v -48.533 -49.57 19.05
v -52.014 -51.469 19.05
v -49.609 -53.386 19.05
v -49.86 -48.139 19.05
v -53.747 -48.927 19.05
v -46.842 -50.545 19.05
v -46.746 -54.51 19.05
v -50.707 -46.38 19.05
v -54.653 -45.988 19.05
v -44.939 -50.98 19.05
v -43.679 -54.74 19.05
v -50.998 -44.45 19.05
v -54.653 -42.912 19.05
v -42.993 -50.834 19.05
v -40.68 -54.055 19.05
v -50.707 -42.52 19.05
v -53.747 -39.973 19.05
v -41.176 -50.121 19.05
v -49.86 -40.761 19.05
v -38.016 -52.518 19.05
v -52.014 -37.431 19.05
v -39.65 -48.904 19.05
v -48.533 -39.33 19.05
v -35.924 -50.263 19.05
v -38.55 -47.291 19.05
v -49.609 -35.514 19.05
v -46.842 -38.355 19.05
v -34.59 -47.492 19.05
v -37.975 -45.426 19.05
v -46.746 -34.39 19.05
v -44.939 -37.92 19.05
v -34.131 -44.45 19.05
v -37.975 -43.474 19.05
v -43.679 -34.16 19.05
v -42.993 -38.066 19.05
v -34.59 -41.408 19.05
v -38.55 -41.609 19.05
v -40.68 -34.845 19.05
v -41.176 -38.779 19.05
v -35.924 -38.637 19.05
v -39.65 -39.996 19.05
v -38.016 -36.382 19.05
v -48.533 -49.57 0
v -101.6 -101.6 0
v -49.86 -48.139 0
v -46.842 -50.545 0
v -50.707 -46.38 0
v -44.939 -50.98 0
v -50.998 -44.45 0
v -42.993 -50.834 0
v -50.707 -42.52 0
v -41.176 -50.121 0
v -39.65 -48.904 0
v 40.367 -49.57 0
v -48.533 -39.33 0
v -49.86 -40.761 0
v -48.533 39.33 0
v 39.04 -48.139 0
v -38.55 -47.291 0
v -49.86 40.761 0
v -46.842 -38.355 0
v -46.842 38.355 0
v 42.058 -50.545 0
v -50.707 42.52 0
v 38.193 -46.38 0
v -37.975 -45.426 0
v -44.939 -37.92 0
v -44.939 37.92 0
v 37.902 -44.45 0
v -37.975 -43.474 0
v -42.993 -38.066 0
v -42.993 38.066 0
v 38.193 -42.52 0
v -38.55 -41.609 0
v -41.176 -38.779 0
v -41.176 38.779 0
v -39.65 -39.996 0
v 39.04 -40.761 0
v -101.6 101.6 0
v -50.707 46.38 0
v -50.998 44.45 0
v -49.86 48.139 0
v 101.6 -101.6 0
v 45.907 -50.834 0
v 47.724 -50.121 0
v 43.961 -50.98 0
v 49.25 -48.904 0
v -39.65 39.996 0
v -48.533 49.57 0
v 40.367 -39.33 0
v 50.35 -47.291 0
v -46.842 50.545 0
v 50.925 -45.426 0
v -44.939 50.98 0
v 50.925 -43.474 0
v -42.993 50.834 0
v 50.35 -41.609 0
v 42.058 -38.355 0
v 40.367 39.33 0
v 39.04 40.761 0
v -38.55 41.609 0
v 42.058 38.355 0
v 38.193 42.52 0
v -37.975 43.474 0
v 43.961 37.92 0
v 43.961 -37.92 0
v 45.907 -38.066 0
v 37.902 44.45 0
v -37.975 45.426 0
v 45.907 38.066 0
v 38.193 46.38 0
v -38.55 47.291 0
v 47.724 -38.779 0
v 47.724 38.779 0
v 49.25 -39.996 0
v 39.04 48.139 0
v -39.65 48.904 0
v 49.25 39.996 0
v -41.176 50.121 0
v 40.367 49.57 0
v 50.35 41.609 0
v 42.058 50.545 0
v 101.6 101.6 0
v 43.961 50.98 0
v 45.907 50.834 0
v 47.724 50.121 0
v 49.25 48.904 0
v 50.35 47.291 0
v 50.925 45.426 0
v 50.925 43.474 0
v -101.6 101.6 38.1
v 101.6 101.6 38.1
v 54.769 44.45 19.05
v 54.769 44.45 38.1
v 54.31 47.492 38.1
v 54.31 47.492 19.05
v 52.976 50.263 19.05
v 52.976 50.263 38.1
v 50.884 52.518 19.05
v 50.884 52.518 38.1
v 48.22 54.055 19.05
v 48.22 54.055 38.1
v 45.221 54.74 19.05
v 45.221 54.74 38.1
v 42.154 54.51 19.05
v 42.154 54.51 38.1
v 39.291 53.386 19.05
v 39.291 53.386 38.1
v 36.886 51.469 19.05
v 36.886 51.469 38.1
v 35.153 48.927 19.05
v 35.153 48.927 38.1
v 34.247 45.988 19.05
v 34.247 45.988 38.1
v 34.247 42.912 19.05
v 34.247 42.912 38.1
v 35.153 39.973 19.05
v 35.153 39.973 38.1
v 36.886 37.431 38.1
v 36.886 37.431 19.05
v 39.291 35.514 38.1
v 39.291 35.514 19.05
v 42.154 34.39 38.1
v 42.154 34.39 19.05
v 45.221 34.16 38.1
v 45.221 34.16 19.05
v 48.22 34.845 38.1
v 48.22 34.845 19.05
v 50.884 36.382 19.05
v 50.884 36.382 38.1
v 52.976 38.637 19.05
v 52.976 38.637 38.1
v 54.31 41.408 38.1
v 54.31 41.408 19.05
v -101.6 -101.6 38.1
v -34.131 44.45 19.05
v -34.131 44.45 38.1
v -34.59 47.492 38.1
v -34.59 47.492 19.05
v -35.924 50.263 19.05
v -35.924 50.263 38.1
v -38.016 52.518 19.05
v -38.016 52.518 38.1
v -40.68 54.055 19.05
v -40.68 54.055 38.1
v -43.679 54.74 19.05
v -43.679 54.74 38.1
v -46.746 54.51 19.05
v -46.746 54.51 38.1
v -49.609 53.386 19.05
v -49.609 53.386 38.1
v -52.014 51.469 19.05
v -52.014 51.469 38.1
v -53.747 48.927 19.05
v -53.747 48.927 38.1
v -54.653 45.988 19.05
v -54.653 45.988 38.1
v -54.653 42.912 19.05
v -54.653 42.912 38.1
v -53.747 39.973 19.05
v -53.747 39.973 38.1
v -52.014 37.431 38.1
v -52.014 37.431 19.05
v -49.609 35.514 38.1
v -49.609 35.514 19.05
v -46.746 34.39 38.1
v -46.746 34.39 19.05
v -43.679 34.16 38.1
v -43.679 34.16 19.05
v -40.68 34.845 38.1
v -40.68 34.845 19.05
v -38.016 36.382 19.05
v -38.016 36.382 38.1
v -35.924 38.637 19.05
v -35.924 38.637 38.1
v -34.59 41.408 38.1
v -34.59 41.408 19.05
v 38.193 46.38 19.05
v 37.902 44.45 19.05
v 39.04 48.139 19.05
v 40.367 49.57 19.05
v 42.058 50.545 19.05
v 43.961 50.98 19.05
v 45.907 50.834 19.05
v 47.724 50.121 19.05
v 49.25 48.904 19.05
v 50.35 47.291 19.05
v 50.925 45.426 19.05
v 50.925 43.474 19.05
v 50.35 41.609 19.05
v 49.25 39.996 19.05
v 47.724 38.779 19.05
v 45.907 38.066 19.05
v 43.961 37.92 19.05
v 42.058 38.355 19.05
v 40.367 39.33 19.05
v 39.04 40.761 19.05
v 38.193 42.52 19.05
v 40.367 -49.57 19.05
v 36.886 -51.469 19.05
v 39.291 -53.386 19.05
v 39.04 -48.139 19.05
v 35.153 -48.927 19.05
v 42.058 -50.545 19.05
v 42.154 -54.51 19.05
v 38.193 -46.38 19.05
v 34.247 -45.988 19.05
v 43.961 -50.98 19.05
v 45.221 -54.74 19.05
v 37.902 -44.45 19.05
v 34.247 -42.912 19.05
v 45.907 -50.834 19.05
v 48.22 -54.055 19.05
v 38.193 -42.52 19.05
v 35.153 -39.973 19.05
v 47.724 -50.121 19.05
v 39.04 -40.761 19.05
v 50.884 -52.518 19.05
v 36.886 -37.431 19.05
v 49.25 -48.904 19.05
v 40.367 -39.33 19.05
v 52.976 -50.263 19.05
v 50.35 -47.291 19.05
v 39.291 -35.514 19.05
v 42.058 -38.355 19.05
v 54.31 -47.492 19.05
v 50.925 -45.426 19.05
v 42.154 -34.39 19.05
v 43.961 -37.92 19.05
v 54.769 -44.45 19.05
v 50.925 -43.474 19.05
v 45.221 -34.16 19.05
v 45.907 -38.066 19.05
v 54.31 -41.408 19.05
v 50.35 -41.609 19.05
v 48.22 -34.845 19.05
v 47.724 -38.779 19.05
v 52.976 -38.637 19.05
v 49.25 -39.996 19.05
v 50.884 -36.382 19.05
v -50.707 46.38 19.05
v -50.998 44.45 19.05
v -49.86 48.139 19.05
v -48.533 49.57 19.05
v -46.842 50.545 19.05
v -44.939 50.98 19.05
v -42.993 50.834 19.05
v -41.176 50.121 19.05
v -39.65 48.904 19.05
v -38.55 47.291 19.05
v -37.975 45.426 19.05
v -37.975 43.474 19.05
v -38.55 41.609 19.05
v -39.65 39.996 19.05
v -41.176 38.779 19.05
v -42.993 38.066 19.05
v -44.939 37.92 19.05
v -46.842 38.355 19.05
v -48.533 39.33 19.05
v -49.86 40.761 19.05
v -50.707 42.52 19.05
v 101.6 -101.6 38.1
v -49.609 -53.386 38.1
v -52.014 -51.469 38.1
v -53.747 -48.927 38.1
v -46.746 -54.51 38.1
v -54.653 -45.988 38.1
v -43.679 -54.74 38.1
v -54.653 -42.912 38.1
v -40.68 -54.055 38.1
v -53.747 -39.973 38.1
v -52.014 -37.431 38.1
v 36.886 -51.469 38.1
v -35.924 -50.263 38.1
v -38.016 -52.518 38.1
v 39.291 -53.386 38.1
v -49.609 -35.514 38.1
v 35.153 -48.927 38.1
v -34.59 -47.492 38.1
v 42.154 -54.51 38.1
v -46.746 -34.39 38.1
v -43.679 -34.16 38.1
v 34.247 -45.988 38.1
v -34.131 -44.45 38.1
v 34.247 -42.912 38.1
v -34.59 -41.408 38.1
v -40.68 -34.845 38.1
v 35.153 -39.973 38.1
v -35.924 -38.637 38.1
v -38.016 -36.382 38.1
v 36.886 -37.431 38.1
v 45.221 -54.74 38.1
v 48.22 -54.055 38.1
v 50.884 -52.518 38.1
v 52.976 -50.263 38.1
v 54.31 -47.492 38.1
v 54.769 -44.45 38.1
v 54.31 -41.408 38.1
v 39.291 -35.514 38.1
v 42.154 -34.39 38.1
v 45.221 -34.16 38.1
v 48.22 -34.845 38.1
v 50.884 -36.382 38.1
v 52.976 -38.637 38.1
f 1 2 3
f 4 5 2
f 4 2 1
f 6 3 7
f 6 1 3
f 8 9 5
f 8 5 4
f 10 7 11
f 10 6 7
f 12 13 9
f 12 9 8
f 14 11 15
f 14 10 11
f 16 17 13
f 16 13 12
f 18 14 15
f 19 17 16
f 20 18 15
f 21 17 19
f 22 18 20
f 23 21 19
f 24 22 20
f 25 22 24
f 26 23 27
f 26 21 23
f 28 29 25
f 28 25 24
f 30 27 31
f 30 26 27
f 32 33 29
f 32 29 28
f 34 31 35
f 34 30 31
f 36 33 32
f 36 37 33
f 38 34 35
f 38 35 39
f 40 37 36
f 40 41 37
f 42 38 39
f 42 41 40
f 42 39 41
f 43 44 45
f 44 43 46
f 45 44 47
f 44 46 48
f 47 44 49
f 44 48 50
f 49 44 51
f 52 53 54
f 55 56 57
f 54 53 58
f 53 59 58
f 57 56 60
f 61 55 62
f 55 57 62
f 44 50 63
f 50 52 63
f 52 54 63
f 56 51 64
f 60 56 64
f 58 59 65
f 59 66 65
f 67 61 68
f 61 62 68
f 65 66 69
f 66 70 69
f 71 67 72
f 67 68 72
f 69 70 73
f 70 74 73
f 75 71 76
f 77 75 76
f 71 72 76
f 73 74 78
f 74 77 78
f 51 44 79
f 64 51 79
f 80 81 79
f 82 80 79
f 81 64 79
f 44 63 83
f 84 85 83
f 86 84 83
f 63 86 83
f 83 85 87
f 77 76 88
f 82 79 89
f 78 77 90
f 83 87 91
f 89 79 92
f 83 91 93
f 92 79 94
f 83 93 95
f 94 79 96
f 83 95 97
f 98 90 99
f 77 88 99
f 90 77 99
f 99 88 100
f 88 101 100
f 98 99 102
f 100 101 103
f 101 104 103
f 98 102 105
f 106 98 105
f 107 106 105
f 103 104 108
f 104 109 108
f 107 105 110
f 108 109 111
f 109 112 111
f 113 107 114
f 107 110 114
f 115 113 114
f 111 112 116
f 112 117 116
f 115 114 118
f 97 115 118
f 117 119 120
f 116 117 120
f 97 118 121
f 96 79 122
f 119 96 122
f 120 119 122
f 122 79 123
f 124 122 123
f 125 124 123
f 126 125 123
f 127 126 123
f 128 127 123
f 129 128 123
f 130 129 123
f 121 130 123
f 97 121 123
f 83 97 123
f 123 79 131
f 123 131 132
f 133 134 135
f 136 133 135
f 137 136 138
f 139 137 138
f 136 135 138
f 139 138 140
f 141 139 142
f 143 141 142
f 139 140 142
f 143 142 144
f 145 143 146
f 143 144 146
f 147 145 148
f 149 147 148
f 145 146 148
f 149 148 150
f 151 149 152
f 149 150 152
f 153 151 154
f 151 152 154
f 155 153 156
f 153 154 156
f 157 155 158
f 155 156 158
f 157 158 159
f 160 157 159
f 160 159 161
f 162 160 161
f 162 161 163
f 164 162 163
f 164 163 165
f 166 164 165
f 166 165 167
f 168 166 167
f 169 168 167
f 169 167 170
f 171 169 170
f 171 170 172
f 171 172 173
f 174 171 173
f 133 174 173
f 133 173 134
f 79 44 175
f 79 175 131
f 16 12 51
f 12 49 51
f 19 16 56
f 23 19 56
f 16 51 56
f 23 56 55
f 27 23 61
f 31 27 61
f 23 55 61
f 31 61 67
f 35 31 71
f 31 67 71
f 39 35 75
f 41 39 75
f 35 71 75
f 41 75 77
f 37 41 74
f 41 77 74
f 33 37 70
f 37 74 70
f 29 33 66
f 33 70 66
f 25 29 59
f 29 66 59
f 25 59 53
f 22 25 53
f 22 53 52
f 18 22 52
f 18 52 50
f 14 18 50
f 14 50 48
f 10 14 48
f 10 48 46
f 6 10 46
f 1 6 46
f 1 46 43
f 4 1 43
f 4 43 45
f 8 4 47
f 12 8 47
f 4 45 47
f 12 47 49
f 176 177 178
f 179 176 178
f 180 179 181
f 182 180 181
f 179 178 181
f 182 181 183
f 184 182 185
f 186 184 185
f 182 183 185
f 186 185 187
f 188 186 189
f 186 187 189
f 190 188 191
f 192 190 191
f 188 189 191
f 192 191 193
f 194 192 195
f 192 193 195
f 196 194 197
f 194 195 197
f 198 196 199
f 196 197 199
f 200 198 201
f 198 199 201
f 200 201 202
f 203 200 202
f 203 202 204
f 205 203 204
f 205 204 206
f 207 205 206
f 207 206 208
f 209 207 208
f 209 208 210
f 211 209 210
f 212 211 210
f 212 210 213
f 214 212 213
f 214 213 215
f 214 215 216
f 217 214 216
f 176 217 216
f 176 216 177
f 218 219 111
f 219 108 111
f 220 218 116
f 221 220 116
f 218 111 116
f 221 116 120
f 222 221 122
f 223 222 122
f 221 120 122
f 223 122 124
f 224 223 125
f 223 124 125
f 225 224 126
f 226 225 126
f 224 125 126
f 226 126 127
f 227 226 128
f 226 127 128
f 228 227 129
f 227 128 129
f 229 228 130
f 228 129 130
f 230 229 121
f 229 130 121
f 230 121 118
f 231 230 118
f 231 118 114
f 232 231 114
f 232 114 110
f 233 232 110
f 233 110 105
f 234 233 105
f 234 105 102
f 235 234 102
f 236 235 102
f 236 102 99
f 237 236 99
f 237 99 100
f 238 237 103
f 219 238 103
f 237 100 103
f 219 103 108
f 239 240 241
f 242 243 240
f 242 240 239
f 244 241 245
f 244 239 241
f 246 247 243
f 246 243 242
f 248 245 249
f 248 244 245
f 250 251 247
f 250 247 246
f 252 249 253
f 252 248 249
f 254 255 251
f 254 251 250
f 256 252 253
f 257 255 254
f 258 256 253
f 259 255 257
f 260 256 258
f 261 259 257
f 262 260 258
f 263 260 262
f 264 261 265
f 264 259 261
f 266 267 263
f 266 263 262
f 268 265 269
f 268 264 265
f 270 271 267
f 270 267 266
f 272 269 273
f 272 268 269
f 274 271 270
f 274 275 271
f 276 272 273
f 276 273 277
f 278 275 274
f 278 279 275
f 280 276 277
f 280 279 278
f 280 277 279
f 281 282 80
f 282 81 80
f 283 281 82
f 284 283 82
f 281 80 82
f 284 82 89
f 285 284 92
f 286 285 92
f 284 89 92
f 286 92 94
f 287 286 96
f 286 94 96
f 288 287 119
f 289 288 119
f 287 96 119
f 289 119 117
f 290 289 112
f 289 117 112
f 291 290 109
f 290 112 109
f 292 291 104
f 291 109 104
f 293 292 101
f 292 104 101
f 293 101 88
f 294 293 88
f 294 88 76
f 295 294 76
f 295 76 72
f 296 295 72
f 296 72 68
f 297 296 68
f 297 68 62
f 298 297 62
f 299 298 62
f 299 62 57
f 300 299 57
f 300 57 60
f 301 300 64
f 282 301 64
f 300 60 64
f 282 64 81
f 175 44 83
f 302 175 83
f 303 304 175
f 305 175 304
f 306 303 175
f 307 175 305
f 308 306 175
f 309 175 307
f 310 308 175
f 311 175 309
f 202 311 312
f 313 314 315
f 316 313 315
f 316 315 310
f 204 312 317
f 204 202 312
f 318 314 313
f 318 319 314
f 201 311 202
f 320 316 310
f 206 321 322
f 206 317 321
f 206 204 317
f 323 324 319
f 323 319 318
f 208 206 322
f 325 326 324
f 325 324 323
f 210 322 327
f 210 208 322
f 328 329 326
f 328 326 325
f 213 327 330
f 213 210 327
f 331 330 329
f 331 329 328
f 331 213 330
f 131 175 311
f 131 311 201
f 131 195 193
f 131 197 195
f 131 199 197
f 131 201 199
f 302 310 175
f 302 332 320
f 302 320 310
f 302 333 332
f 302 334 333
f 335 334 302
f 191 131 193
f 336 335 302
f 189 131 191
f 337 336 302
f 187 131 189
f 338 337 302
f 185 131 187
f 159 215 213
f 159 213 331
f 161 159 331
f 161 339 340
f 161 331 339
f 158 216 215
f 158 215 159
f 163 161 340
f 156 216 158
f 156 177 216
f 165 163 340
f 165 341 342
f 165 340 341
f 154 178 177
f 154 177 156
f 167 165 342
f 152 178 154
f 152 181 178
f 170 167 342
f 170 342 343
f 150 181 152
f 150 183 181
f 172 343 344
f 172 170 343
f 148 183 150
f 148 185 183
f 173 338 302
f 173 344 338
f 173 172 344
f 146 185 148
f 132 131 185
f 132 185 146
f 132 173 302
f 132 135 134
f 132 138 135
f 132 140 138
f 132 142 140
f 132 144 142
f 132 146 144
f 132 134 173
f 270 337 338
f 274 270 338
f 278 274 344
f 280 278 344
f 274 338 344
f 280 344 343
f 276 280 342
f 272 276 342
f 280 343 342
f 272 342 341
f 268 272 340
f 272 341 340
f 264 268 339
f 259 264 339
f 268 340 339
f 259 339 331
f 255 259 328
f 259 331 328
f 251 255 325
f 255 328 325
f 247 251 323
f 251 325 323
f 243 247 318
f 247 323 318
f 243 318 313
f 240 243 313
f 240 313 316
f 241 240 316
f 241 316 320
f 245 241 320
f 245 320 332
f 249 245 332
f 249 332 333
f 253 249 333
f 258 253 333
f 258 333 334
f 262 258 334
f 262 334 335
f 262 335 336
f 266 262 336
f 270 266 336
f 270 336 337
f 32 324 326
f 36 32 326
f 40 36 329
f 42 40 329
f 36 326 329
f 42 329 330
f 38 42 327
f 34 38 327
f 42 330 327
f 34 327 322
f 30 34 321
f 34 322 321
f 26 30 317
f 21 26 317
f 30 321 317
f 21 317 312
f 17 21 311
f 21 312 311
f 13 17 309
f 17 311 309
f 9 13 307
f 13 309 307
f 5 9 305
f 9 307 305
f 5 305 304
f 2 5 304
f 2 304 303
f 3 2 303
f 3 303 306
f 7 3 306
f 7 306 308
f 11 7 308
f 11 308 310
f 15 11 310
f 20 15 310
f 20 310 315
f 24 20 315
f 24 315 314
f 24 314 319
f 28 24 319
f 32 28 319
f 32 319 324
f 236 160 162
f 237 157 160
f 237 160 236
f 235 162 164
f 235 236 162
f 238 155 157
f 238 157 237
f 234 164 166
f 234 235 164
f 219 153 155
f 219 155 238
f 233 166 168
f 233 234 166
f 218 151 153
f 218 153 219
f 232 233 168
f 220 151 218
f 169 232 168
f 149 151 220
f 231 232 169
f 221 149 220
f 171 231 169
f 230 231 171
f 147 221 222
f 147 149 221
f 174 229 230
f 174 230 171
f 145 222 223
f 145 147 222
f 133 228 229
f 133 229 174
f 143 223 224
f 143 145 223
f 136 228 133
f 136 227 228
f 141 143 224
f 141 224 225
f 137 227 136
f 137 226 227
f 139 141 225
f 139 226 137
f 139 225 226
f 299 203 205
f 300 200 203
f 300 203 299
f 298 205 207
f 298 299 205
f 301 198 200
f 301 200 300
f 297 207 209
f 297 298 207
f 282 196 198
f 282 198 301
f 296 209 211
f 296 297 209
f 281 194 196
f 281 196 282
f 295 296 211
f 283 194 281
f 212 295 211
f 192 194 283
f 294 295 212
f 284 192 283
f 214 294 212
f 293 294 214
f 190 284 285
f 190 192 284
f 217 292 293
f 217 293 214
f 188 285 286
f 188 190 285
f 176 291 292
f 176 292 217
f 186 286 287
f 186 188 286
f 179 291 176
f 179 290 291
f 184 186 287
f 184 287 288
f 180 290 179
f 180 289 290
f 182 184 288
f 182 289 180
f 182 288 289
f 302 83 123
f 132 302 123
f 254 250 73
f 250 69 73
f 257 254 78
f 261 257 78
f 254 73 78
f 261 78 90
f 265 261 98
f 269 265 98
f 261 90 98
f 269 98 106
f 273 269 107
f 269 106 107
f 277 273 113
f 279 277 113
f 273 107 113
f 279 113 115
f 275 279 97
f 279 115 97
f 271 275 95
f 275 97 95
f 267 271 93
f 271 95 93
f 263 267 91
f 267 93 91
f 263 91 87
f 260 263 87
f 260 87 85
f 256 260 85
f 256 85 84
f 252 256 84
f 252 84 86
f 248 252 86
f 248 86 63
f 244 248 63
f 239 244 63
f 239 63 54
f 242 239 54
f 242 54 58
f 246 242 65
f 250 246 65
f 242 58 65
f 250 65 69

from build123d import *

# Parameters (mm, degrees)
SKETCH1_W                                        = 203.2
SKETCH1_H                                        = 203.2
BOSS_EXTRUDE1_DEPTH                              = 38.1
CBORE_FOR_1_2_SOCKET_HEAD_CAP_SCREW1_D           = 13.09624
CBORE_FOR_1_2_SOCKET_HEAD_CAP_SCREW1_CBORE_D     = 20.6375
CBORE_FOR_1_2_SOCKET_HEAD_CAP_SCREW1_CBORE_DEPTH = 19.05


with BuildPart() as part:
    # Sketch1 → Boss-Extrude1 (new body)
    with BuildSketch(Plane.XY):
        Rectangle(SKETCH1_W, SKETCH1_H)
    extrude(amount=BOSS_EXTRUDE1_DEPTH)

    # CBORE for 1/2 Socket Head Cap Screw1 (through all)
    with Locations(Plane.XY.offset(38.1)):
        with Locations((44.45, -44.45), (-44.45, -44.45), (-44.45, 44.45), (44.45, 44.45)):
            CounterBoreHole(CBORE_FOR_1_2_SOCKET_HEAD_CAP_SCREW1_D / 2, CBORE_FOR_1_2_SOCKET_HEAD_CAP_SCREW1_CBORE_D / 2, CBORE_FOR_1_2_SOCKET_HEAD_CAP_SCREW1_CBORE_DEPTH)


solid = part.part
